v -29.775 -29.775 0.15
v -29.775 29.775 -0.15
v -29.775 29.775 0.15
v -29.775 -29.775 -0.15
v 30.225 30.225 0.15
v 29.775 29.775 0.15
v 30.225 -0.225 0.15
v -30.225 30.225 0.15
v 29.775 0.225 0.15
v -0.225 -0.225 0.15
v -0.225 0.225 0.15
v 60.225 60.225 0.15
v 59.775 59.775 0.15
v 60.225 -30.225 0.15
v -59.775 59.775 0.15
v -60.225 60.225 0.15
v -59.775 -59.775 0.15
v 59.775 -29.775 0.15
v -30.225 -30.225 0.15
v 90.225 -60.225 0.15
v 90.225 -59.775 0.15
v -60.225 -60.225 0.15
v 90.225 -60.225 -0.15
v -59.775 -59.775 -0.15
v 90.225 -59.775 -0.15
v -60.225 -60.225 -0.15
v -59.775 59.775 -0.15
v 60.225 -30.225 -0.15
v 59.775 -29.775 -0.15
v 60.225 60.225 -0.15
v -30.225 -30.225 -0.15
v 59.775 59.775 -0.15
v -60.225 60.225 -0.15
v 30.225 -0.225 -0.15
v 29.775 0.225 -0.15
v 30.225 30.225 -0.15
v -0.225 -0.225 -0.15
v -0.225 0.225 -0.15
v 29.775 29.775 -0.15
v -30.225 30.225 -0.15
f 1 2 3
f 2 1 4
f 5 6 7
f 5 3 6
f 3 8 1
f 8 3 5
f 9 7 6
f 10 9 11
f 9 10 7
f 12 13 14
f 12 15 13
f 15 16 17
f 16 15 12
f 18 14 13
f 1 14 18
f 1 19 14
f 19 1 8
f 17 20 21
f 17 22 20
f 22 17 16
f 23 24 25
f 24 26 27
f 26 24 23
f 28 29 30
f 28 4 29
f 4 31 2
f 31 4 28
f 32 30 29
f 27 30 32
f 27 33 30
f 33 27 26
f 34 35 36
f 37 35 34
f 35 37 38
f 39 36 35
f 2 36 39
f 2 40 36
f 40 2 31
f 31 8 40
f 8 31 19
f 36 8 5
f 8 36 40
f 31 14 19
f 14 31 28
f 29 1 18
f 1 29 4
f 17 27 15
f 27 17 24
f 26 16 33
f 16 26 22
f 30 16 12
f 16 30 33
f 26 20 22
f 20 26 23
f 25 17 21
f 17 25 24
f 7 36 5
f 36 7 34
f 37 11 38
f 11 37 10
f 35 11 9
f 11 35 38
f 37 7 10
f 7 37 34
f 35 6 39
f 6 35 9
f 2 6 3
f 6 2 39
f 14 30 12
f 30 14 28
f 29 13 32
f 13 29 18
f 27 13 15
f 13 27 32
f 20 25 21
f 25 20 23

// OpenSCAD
zheight = 0.3; //height of the line drawn, ideally 0.1mm less than layer height?
width = 0.45; //modify so CURA renders as just one line draw

SPIRAL_LENGTH = 30;

CYCLE_COUNT = 8; // modify so spiral fits print bed
tgtdetail = 90;
module calibration_spiral() {
	for(i=[0:CYCLE_COUNT]) {
		union() {
			CUR_LOOP = ((i - (i%4))/4) + 1;

			if(i%4==0) {
				translate([SPIRAL_LENGTH*CUR_LOOP/2,-1*SPIRAL_LENGTH*(CUR_LOOP-1),0])
				cube([SPIRAL_LENGTH*CUR_LOOP+(width),width,zheight],center=true);
			}
			else if(i%4==1) {
				
				if(i==1) {
					Y_OFFSET = SPIRAL_LENGTH/2;
				
					translate([SPIRAL_LENGTH*CUR_LOOP,Y_OFFSET,0])
						cube([width,SPIRAL_LENGTH*CUR_LOOP+width,zheight],center=true);
				} else {
					Y_OFFSET = SPIRAL_LENGTH/2;
					translate([SPIRAL_LENGTH*CUR_LOOP,Y_OFFSET,0])
						cube([width,SPIRAL_LENGTH*CUR_LOOP + (SPIRAL_LENGTH*(CUR_LOOP-1))+width,zheight],center=true);
				}
			}
			else if(i%4==2) {
				translate([0,CUR_LOOP*SPIRAL_LENGTH,0])
					cube([SPIRAL_LENGTH*CUR_LOOP*2,width,zheight],center=true);
				
			}
			else if(i%4==3) {
				Y_OFFSET = 0;//SPIRAL_LENGTH*CUR_LOOP/2;
				
				translate([-1*SPIRAL_LENGTH*CUR_LOOP,Y_OFFSET,0])
					cube([width,SPIRAL_LENGTH*(CUR_LOOP+1) + (SPIRAL_LENGTH*(CUR_LOOP-1))+width,zheight],center=true);
				
				//finishing bottom row
				translate([SPIRAL_LENGTH*CUR_LOOP/-2,-1*SPIRAL_LENGTH*(CUR_LOOP),0])
					cube([SPIRAL_LENGTH*CUR_LOOP,width,zheight],center=true);
			}		
		}
	}

}

module overhang(intervals) {
    tgt_y = 4;
    pillar_width = 3;
    for(i=[1:6]) {
        translate([0,i*(tgt_y + 1),0])
        union() {
            translate([0,0,-1.4]) 
                cube([pillar_width*2+(i*intervals),tgt_y,0.2],center=true);
            difference() {
                cube([pillar_width*2+(i*intervals),tgt_y,3],center=true);
                translate([0,0,-1.5])
                    cube([1 + (i*2),tgt_y+2,4],center=true);
            }
        }
    }


}

calibration_spiral();
